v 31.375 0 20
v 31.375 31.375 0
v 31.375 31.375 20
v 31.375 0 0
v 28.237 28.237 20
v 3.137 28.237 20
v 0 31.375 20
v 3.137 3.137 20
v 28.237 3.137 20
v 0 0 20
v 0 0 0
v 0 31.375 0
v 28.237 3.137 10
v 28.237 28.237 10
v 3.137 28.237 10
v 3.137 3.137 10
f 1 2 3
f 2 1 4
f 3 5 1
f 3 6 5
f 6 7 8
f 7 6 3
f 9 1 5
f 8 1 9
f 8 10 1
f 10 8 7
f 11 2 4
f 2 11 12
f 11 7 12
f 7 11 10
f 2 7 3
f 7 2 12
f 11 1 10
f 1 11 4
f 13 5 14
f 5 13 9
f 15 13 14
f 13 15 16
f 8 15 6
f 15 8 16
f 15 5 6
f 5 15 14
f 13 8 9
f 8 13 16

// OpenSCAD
Rl = 25.1;
Rw = 25.1;
outer_footprint_factor = 0.25;
total_boot_height = 20;
ram_depth = 10;

Bl = (Rl*outer_footprint_factor)+Rl;
Bw = (Rw*outer_footprint_factor)+Rw;

module boot() {
    cube([Bl, Bw, total_boot_height]);
}

module inset() {
    translate([(Bl-Rl)/2,(Bw-Rw)/2,total_boot_height-ram_depth]) cube([Rl,Rw,ram_depth]);
}


module fp () {
    difference()
    {
        boot();
        inset();
    }
}


fp();
